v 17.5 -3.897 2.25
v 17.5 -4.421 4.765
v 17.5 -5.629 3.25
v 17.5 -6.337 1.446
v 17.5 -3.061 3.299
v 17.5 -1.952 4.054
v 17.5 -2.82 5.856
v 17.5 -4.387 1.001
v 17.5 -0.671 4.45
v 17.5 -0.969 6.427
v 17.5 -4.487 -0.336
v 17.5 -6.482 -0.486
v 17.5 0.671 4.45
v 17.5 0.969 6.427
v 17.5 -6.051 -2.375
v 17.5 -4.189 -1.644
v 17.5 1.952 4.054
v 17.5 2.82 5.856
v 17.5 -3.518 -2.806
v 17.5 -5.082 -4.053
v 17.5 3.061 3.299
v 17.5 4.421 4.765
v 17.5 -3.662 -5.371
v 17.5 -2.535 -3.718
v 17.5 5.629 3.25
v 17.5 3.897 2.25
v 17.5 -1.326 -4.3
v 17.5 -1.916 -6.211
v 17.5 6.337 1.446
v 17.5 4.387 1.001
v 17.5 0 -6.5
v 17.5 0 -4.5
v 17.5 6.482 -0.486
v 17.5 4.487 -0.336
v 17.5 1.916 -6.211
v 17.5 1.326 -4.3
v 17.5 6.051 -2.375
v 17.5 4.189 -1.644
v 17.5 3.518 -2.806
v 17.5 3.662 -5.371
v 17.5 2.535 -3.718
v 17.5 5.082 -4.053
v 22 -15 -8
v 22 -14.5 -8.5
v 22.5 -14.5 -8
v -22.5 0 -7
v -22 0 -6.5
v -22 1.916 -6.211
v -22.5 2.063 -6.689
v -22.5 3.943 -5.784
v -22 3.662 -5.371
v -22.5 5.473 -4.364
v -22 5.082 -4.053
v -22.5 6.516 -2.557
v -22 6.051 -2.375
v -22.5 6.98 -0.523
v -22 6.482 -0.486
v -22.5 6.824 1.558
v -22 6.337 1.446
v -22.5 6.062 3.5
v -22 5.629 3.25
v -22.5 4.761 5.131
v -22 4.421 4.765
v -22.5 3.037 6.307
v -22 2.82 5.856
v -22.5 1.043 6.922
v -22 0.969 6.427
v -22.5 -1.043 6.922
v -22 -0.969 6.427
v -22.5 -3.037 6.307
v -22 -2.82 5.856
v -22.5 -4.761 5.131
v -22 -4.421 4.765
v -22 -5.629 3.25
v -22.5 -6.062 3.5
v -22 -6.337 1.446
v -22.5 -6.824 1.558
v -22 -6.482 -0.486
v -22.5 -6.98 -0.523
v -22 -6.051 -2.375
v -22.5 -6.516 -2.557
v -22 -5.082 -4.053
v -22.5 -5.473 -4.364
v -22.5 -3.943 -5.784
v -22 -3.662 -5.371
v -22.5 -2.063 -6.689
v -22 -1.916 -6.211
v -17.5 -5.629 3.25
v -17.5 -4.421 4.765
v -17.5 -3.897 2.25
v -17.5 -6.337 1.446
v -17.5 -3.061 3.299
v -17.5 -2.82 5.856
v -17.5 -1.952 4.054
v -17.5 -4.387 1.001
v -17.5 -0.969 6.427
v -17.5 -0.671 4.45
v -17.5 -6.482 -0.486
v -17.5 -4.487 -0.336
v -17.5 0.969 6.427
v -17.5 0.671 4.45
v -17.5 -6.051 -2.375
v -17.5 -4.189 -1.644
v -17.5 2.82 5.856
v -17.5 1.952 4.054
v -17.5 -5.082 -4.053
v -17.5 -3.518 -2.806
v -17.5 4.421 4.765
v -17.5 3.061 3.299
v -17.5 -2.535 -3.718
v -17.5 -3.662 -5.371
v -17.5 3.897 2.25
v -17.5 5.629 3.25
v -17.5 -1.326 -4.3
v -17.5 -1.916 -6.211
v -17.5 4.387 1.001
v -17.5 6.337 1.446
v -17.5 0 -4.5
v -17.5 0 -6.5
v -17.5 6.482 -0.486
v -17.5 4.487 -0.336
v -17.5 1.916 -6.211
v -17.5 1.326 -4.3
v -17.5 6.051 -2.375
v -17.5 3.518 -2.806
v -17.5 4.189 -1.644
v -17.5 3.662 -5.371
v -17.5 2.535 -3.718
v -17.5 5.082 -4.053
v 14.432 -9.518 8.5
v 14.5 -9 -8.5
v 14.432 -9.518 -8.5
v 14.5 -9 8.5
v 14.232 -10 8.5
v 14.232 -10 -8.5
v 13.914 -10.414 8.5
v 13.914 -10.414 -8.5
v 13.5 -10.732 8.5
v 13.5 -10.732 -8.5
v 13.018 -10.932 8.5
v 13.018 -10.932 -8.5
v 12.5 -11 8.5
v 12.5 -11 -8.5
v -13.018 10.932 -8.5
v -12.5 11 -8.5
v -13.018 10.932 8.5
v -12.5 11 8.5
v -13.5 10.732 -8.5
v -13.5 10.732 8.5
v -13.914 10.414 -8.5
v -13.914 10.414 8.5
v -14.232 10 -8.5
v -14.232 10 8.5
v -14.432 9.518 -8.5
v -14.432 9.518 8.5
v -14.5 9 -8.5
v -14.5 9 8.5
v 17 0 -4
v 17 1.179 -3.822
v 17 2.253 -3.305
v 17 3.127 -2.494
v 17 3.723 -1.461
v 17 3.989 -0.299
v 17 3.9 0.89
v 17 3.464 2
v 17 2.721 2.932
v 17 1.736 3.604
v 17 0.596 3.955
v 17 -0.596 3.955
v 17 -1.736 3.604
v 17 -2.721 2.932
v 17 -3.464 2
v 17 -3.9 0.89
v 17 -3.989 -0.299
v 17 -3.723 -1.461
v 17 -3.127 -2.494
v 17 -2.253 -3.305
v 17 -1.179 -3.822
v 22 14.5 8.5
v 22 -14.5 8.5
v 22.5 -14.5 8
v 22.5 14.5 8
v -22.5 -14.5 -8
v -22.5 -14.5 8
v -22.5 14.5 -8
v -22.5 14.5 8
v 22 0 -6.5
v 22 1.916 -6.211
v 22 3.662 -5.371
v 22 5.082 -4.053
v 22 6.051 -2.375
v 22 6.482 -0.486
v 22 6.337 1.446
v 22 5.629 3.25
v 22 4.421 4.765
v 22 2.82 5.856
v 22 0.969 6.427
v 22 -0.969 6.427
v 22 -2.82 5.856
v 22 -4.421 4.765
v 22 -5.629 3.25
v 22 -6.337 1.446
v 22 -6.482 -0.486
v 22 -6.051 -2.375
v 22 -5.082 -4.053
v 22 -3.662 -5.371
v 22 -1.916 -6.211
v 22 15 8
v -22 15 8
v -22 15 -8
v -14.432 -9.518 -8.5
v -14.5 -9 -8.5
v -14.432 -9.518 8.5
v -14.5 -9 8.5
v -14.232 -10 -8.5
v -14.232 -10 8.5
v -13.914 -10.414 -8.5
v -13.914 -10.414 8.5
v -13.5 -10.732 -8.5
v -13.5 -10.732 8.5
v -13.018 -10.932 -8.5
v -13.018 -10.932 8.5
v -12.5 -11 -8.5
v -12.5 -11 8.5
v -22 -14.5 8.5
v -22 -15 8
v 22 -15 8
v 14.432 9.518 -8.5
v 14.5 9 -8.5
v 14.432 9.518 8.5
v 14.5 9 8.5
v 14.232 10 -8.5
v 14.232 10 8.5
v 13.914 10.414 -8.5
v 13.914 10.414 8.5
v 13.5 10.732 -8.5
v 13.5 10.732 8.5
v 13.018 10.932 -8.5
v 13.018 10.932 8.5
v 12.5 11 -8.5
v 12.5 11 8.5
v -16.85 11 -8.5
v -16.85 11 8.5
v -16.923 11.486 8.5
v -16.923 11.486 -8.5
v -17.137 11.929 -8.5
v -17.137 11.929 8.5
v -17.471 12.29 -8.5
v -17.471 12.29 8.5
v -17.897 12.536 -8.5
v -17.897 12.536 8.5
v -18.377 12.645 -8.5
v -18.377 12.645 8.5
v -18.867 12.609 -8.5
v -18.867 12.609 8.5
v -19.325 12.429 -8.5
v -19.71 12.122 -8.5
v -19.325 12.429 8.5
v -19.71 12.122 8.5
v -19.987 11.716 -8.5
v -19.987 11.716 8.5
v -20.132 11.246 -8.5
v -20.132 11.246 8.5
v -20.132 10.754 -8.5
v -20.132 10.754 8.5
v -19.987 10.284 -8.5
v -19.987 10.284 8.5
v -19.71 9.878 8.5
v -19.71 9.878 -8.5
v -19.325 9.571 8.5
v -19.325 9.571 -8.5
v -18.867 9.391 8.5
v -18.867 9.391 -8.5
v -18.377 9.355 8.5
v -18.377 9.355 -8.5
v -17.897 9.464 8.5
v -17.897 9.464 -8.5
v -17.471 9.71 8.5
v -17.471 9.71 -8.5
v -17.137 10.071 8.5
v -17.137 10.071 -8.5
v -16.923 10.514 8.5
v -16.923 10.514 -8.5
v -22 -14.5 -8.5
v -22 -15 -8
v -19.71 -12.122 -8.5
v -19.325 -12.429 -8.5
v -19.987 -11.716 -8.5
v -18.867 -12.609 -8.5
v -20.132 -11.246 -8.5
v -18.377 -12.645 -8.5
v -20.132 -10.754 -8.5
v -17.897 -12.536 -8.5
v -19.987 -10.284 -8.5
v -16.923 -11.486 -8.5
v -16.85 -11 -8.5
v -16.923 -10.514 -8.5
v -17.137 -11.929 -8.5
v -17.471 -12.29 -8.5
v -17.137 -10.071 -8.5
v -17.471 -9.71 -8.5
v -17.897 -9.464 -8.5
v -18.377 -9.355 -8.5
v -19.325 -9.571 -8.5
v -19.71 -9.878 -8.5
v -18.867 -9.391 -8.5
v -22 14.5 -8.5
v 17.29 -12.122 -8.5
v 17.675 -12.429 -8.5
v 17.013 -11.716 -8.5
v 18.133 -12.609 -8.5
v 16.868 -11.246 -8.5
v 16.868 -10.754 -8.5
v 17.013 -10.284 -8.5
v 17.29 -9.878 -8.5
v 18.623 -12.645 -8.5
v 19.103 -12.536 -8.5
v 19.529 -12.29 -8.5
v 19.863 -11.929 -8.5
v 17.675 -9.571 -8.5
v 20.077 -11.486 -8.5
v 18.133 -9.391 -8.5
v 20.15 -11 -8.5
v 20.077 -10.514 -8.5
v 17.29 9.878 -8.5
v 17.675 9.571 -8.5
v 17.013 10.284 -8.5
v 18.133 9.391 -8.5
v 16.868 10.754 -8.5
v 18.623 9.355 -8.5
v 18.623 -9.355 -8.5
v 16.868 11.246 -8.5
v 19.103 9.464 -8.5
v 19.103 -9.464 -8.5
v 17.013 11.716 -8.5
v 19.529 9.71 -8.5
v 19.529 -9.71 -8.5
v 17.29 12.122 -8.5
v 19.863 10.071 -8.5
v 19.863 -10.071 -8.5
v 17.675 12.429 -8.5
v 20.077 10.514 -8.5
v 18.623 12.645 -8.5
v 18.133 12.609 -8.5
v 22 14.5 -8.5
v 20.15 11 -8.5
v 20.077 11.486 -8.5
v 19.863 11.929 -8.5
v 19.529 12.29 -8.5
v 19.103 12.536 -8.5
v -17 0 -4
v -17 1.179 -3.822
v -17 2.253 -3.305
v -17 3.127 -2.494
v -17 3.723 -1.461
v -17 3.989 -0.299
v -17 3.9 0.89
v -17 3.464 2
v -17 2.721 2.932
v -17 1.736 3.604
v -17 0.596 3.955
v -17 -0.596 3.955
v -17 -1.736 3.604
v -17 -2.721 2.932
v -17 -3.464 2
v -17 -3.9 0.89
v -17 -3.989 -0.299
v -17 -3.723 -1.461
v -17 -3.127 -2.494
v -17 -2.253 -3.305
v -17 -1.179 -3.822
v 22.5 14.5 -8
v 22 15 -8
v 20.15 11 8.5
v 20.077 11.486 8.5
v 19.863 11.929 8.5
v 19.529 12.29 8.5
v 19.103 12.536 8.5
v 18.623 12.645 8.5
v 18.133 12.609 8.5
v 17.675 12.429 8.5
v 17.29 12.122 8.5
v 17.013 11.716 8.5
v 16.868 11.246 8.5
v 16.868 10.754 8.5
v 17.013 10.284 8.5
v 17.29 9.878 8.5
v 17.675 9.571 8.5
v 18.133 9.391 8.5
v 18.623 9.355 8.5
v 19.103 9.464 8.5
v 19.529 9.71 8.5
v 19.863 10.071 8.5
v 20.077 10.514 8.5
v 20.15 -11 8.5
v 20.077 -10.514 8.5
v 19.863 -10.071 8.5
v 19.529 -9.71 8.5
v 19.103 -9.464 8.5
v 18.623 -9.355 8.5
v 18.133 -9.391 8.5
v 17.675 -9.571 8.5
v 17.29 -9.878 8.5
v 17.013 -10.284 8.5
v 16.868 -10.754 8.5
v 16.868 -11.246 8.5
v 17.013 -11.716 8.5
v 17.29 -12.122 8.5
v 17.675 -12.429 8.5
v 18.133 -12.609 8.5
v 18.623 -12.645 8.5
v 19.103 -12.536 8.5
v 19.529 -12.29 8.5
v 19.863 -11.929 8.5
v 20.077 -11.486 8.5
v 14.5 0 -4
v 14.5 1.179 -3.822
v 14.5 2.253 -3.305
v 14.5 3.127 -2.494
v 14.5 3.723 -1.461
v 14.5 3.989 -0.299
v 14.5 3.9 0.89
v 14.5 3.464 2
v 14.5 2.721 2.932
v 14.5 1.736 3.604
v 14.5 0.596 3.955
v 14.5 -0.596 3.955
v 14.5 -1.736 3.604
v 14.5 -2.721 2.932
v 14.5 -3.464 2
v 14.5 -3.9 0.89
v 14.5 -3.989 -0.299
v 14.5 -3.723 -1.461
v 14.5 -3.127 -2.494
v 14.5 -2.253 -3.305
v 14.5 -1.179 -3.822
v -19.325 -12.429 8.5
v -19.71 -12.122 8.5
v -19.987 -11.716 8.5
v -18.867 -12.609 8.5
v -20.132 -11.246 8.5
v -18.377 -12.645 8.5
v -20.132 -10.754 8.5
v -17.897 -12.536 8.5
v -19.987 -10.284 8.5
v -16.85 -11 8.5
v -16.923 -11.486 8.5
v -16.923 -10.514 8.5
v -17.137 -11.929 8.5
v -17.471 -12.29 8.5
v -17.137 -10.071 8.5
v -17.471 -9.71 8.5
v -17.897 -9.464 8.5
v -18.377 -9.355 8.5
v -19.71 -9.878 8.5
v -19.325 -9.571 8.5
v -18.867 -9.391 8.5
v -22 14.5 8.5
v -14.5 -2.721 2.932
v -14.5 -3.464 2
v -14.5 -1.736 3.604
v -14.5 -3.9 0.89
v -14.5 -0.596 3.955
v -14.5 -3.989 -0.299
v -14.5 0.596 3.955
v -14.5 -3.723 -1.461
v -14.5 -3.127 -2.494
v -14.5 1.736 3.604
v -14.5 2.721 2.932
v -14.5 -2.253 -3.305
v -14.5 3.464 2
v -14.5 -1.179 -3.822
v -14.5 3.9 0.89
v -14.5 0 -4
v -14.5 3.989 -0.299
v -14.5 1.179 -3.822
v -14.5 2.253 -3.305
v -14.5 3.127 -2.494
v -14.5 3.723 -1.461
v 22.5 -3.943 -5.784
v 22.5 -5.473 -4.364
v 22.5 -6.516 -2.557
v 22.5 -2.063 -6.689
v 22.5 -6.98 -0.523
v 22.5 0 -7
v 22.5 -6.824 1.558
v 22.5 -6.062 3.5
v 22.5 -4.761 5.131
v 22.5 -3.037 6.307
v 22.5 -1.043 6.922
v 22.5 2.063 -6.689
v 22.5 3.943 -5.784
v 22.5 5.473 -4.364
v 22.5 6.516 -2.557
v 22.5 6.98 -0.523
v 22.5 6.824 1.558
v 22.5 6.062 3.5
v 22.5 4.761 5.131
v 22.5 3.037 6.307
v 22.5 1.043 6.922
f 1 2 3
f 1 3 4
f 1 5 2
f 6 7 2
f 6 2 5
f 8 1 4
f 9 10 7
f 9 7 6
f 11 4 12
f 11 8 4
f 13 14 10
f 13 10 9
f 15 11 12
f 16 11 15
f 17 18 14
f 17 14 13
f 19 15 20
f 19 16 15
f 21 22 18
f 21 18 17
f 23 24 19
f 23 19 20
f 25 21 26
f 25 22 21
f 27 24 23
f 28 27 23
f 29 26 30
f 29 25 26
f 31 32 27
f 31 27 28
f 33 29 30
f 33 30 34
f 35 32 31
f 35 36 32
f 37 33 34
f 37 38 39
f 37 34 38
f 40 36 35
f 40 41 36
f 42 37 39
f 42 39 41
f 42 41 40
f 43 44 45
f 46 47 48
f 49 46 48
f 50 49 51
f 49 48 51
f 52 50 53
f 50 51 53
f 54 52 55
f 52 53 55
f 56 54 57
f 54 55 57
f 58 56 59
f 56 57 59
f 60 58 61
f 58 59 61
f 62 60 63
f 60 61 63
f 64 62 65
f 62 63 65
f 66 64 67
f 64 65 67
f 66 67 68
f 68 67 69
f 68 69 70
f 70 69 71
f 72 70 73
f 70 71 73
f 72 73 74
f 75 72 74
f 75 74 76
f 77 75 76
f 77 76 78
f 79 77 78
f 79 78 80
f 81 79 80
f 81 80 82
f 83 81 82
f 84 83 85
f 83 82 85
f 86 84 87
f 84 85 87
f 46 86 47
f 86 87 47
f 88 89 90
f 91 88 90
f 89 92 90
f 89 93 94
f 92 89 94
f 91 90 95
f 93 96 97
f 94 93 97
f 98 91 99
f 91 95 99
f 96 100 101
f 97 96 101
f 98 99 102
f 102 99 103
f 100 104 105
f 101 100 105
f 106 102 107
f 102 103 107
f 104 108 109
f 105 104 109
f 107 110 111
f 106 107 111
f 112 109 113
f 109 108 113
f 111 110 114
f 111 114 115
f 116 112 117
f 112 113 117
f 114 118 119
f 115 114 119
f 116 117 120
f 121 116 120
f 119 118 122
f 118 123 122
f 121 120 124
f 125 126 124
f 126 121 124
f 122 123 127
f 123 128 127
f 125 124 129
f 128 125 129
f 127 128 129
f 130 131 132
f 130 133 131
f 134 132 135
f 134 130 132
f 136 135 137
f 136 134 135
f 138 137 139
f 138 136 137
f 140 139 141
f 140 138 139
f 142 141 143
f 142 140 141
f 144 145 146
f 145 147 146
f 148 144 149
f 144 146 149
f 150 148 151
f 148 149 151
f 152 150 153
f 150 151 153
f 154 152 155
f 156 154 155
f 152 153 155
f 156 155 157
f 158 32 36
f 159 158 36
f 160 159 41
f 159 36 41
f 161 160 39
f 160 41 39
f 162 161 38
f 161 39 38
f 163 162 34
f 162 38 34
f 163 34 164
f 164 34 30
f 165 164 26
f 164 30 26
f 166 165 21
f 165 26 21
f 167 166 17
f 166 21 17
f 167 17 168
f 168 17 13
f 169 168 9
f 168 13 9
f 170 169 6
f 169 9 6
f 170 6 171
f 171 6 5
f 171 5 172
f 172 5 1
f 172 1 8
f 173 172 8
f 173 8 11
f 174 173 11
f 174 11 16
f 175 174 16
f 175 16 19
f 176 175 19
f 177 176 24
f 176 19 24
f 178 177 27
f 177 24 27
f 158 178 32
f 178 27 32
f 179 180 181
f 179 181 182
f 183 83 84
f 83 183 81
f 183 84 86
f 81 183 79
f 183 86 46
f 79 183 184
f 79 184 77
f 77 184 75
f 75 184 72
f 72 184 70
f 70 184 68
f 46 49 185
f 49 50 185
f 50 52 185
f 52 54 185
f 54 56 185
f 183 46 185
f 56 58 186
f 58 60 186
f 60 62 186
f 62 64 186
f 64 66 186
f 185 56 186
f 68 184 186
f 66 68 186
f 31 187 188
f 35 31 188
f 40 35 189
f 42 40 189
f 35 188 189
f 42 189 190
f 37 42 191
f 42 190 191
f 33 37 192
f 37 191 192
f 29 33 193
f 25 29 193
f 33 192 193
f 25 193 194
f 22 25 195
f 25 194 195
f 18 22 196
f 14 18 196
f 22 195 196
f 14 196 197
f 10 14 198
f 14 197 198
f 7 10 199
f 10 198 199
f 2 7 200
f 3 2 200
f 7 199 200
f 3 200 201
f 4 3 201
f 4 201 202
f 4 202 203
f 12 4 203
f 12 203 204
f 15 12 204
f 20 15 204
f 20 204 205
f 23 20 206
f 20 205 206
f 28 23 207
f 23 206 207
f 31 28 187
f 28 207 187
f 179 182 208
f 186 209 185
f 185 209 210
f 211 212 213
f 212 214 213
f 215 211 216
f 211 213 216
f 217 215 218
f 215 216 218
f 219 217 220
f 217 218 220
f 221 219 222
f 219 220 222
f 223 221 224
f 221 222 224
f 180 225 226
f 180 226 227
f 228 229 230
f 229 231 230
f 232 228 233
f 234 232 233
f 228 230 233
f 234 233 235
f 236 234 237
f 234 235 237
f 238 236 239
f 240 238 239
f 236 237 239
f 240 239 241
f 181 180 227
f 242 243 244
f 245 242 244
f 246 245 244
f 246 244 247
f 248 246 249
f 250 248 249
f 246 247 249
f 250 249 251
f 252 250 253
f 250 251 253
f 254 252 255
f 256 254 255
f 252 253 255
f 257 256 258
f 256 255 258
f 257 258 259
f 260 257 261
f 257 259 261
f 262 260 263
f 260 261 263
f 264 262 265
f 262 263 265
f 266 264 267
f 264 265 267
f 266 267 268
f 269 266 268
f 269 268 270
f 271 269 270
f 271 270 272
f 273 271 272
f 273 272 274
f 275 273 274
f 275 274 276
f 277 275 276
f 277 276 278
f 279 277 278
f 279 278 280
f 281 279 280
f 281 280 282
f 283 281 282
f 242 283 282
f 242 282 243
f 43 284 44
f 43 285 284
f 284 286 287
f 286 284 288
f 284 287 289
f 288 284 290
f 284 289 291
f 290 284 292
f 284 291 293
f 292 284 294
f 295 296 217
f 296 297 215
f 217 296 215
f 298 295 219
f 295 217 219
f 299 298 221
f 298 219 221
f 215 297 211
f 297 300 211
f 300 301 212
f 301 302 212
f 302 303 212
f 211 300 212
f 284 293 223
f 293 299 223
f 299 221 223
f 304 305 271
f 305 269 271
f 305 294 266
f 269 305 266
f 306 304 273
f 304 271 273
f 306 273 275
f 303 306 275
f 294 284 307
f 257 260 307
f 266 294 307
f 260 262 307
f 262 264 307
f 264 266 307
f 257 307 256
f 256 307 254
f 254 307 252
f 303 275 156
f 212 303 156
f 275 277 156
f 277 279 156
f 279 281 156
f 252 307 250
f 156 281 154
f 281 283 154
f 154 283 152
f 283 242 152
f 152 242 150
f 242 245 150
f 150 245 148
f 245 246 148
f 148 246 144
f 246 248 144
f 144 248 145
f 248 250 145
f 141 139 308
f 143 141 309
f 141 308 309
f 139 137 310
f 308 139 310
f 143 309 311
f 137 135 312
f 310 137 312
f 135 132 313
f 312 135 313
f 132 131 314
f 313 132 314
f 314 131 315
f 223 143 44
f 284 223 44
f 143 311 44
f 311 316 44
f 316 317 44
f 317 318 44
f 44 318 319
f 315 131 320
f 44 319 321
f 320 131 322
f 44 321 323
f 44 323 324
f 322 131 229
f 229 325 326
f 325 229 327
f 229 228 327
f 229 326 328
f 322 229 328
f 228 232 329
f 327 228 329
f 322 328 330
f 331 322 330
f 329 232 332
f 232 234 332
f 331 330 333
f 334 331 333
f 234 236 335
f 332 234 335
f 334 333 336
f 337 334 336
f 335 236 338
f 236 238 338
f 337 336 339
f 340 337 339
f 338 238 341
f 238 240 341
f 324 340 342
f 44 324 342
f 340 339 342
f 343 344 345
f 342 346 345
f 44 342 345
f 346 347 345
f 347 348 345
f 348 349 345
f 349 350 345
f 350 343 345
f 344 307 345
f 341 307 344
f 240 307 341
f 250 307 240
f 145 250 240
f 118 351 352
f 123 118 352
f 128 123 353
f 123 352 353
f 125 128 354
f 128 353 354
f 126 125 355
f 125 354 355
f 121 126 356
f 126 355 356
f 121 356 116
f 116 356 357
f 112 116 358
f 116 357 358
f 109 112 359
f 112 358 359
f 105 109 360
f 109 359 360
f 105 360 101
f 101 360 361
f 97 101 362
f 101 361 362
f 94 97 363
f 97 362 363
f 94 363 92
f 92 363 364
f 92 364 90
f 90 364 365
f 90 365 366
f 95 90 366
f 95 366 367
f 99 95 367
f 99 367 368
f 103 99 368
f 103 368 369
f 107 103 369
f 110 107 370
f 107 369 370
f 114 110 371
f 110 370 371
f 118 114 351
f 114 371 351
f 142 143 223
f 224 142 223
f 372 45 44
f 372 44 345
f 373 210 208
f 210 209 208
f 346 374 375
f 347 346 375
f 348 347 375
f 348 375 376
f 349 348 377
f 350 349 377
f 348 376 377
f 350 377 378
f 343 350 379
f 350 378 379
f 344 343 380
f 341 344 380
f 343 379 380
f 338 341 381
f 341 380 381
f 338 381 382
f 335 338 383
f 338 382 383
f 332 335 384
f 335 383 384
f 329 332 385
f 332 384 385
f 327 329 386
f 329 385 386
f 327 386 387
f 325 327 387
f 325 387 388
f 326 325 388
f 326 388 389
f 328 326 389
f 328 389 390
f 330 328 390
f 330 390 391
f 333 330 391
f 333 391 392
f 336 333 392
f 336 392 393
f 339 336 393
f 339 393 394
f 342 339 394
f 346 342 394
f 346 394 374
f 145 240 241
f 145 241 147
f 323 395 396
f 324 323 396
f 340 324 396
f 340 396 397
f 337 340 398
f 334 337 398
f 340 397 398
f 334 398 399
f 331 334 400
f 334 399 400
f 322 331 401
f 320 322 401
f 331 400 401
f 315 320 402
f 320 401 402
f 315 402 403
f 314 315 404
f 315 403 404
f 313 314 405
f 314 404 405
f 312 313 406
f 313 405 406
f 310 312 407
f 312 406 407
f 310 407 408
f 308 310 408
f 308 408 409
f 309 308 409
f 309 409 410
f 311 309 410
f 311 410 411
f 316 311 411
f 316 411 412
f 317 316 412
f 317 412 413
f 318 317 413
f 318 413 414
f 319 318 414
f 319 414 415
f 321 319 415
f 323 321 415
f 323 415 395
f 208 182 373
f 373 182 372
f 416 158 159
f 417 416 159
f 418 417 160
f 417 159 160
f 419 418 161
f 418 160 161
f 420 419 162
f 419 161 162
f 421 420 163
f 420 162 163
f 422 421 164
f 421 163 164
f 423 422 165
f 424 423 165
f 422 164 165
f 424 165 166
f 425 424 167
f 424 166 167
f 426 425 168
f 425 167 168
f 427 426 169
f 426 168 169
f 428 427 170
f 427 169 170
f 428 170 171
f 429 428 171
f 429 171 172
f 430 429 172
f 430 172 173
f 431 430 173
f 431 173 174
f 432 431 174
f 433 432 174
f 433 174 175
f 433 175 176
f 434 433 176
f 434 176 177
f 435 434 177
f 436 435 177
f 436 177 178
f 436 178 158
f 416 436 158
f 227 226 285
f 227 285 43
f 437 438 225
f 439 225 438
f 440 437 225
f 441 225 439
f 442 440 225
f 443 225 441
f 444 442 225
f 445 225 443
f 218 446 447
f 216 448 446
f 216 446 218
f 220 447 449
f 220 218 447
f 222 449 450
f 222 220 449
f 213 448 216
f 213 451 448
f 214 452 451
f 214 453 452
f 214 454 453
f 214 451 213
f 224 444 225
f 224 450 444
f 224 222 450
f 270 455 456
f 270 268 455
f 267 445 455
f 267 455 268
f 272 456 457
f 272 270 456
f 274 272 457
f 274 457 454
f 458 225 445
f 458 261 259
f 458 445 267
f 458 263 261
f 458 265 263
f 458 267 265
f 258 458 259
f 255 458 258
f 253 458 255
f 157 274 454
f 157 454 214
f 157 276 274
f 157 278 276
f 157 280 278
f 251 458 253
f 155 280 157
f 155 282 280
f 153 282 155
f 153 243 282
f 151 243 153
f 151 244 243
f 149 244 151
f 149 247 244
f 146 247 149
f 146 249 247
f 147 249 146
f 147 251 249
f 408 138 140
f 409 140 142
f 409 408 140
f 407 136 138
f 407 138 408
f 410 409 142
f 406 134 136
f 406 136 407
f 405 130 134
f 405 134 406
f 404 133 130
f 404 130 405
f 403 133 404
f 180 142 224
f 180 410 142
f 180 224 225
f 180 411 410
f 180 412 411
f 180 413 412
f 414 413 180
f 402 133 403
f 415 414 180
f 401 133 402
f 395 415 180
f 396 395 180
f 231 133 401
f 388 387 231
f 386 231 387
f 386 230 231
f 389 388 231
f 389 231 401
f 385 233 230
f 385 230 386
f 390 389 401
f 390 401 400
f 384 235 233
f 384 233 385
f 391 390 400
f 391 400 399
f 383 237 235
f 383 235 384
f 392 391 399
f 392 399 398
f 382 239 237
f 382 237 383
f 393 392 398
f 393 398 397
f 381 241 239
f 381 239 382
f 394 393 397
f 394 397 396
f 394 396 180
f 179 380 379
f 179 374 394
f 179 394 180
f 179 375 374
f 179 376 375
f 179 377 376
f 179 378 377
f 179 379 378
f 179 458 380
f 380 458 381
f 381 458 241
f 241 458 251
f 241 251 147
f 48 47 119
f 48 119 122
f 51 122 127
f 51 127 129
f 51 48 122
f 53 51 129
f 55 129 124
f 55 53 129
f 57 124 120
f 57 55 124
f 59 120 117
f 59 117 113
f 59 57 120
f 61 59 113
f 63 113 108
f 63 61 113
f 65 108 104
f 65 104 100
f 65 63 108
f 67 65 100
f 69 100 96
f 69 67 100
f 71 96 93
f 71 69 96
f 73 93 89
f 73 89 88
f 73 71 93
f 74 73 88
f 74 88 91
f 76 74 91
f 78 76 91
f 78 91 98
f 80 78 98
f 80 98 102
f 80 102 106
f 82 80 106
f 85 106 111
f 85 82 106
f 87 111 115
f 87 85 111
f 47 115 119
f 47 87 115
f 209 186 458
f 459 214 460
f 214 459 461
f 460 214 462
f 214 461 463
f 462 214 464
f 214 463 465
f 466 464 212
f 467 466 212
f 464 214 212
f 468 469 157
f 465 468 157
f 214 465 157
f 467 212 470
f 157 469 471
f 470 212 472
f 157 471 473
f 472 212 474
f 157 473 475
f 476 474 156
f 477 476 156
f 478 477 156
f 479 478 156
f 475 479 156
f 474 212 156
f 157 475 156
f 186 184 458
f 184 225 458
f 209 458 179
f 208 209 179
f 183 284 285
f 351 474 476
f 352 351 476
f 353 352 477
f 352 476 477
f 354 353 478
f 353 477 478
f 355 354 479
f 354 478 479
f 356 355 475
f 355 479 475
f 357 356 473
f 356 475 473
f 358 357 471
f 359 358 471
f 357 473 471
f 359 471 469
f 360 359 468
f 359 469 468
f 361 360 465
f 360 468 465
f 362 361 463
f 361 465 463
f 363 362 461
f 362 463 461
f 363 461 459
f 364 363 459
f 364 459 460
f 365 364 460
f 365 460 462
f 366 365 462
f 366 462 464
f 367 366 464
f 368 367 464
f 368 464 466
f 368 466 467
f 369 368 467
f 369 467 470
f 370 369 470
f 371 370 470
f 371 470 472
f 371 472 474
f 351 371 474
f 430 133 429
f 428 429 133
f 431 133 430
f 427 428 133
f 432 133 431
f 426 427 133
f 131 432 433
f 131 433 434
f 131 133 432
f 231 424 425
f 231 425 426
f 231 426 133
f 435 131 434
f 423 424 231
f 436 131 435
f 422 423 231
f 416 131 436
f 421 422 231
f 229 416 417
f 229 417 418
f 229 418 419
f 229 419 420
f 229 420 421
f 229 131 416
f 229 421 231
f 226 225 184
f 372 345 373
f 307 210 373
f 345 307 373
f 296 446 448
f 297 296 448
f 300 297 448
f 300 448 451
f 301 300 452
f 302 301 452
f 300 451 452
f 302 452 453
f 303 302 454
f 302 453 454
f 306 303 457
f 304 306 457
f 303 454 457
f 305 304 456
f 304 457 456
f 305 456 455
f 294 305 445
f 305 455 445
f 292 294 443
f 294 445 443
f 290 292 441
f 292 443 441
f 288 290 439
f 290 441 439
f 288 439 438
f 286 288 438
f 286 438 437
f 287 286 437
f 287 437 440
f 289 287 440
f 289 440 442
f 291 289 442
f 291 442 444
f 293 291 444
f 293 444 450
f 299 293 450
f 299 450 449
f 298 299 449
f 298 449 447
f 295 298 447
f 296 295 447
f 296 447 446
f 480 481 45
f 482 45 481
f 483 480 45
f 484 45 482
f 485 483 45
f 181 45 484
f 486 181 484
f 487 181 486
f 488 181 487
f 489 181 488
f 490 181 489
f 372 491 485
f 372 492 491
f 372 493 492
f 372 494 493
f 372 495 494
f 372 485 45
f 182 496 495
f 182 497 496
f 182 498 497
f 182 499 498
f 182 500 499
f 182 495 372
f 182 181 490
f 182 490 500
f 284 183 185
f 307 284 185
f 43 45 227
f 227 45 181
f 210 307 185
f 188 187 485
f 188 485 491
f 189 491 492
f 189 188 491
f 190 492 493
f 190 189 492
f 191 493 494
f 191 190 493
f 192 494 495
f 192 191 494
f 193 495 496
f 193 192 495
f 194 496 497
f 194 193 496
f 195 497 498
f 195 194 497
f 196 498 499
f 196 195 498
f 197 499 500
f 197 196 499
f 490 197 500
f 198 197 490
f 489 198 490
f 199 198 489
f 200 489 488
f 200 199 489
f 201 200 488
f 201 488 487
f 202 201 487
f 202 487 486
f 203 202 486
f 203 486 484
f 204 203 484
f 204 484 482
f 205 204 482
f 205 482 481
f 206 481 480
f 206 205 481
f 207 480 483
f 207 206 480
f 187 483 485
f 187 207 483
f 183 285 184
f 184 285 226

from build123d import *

# Parameters (mm, degrees)
SKETCH_1_W          = 45
SKETCH_1_H          = 30
EXTRUDE_1_DEPTH     = 8.5
SKETCH_2_R          = 6.5
CUT_EXTRUDE_1_DEPTH = 5
SKETCH_3_R          = 4
CUT_EXTRUDE_2_DEPTH = 53
CHAMFER_1_SIZE      = 0.5
HOLE_WIZARD_M4_1_D  = 3.3
SKETCH_7_W          = 29
SKETCH_7_H          = 22
CUT_EXTRUDE_3_DEPTH = 53
FILLET_1_R          = 2
CHAMFER_2_SIZE      = 0.5


with BuildPart() as part:
    # 草图1 → 凸台-拉伸1 (new, symmetric)
    with BuildSketch(Plane.XY):
        Rectangle(SKETCH_1_W, SKETCH_1_H)
    extrude(amount=EXTRUDE_1_DEPTH, both=True)

    # 草图2 → 切除-拉伸1 (cut)
    with BuildSketch(Plane(origin=(22.5, 0, 0), x_dir=(0, 0, -1), z_dir=(1, 0, 0))):
        Circle(SKETCH_2_R)
    cut_extrude_1 = extrude(amount=-CUT_EXTRUDE_1_DEPTH, mode=Mode.SUBTRACT)

    # 镜向1: 切除-拉伸1 across plane
    add(cut_extrude_1.mirror(Plane(origin=(0, 0, 0), x_dir=(0, 0, 1), z_dir=(1, 0, 0))), mode=Mode.SUBTRACT)

    # 草图3 → 切除-拉伸2 (cut)
    with BuildSketch(Plane(origin=(17.5, 0, 0), x_dir=(0, 0, -1), z_dir=(1, 0, 0))):
        Circle(SKETCH_3_R)
    extrude(amount=-CUT_EXTRUDE_2_DEPTH, mode=Mode.SUBTRACT)

    # 倒角1
    chamfer_1_edges = [part.edges().sort_by_distance(p)[0] for p in [
        (22.5, 0, 6.5),
        (-22.5, 0, 6.5),
        (-17.5, 0, 4),
        (17.5, 0, 4),
    ]]
    chamfer(chamfer_1_edges, length=CHAMFER_1_SIZE)

    # M4 螺纹孔1 (through all)
    with Locations(Plane(origin=(0, 0, -8.5), x_dir=(-1, 0, 0), z_dir=(0, 0, -1))):
        with Locations((-18.5, 11), (18.5, 11), (-18.5, -11), (18.5, -11)):
            Hole(HOLE_WIZARD_M4_1_D / 2)

    # 草图7 → 切除-拉伸3 (cut)
    with BuildSketch(Plane(origin=(0, 0, -8.5), x_dir=(-1, 0, 0), z_dir=(0, 0, -1))):
        Rectangle(SKETCH_7_W, SKETCH_7_H)
    extrude(amount=-CUT_EXTRUDE_3_DEPTH, mode=Mode.SUBTRACT)

    # 圆角1
    fillet_1_edges = [part.edges().sort_by_distance(p)[0] for p in [
        (-14.5, -11, 0),
        (14.5, 11, 0),
        (-14.5, 11, 0),
        (14.5, -11, 0),
    ]]
    fillet(fillet_1_edges, radius=FILLET_1_R)

    # 倒角2
    chamfer_2_edges = [part.edges().sort_by_distance(p)[0] for p in [
        (-22.5, 0, 8.5),
        (0, -15, 8.5),
        (22.5, 0, 8.5),
        (0, -15, -8.5),
        (-22.5, 0, -8.5),
        (0, 15, -8.5),
        (22.5, 0, -8.5),
        (22.5, -15, 0),
        (-22.5, -15, 0),
        (-22.5, 15, 0),
        (22.5, 15, 0),
        (0, 15, 8.5),
    ]]
    chamfer(chamfer_2_edges, length=CHAMFER_2_SIZE)


solid = part.part
